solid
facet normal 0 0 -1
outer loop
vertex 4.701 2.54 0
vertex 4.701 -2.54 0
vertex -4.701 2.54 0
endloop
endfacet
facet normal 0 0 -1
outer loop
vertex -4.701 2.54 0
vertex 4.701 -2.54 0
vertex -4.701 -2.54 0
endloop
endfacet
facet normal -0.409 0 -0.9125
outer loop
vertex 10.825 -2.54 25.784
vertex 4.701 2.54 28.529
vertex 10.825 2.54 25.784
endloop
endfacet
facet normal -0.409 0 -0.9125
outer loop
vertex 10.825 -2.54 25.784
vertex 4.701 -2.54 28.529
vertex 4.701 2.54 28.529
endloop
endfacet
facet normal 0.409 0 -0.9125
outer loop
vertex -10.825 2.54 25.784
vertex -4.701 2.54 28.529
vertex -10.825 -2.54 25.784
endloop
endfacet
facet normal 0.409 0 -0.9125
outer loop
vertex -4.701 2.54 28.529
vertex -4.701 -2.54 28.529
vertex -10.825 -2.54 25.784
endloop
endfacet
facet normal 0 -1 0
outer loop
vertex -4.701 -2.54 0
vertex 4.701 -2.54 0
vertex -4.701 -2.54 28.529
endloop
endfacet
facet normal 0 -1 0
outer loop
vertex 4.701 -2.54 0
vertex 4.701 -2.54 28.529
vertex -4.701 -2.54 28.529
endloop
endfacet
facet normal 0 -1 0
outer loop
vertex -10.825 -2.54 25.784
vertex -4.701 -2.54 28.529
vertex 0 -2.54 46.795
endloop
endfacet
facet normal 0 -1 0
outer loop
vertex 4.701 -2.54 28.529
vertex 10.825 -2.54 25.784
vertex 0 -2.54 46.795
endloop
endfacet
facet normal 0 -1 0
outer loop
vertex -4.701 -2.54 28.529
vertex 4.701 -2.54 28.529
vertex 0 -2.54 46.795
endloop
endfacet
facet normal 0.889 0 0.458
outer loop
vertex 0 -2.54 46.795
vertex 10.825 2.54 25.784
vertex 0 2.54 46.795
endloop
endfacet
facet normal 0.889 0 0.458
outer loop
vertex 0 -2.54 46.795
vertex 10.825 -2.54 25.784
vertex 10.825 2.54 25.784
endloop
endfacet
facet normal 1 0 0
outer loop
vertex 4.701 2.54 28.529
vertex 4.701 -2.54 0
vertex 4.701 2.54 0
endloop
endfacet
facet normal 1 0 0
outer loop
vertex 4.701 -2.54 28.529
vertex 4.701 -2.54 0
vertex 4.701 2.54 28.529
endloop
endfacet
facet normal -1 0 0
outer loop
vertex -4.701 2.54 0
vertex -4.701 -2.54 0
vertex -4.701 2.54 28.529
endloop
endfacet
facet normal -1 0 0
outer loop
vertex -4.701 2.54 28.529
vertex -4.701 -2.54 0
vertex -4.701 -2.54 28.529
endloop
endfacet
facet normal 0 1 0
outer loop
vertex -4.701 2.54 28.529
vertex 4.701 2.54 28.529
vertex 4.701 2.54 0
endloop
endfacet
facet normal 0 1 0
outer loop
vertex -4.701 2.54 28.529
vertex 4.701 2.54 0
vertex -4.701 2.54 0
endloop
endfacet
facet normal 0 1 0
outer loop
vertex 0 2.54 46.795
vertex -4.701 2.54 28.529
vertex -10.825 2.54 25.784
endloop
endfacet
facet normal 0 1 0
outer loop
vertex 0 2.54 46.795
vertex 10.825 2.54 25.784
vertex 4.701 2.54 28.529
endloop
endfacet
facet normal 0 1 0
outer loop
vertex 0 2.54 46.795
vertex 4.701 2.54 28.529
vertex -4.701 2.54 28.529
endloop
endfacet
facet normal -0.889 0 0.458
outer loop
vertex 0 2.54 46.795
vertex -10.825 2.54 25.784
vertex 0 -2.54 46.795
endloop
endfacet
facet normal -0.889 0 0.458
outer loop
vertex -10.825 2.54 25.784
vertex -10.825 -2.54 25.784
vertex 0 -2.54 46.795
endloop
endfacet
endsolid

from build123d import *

# Parameters (mm, degrees)
F1_DEPTH = 2.54


with BuildPart() as f1:
    # F0 (on Front) → F1 (new body, symmetric)
    with BuildSketch(Plane.XZ):
        Polygon((0, 46.7954538763), (0, 0), (4.7010933049, 0), (4.7010933049, 28.528785333), (10.8251795173, 25.7835052907), align=None)
    extrude(amount=F1_DEPTH, both=True)

    # F2: F1 across face


with BuildPart() as f1_1:
    add(f1.part)
    add(f1.part.mirror(Plane(origin=(0, 0, 23.3977269381), x_dir=(0, -1, 0), z_dir=(-1, 0, 0))))


solid = f1_1.part
